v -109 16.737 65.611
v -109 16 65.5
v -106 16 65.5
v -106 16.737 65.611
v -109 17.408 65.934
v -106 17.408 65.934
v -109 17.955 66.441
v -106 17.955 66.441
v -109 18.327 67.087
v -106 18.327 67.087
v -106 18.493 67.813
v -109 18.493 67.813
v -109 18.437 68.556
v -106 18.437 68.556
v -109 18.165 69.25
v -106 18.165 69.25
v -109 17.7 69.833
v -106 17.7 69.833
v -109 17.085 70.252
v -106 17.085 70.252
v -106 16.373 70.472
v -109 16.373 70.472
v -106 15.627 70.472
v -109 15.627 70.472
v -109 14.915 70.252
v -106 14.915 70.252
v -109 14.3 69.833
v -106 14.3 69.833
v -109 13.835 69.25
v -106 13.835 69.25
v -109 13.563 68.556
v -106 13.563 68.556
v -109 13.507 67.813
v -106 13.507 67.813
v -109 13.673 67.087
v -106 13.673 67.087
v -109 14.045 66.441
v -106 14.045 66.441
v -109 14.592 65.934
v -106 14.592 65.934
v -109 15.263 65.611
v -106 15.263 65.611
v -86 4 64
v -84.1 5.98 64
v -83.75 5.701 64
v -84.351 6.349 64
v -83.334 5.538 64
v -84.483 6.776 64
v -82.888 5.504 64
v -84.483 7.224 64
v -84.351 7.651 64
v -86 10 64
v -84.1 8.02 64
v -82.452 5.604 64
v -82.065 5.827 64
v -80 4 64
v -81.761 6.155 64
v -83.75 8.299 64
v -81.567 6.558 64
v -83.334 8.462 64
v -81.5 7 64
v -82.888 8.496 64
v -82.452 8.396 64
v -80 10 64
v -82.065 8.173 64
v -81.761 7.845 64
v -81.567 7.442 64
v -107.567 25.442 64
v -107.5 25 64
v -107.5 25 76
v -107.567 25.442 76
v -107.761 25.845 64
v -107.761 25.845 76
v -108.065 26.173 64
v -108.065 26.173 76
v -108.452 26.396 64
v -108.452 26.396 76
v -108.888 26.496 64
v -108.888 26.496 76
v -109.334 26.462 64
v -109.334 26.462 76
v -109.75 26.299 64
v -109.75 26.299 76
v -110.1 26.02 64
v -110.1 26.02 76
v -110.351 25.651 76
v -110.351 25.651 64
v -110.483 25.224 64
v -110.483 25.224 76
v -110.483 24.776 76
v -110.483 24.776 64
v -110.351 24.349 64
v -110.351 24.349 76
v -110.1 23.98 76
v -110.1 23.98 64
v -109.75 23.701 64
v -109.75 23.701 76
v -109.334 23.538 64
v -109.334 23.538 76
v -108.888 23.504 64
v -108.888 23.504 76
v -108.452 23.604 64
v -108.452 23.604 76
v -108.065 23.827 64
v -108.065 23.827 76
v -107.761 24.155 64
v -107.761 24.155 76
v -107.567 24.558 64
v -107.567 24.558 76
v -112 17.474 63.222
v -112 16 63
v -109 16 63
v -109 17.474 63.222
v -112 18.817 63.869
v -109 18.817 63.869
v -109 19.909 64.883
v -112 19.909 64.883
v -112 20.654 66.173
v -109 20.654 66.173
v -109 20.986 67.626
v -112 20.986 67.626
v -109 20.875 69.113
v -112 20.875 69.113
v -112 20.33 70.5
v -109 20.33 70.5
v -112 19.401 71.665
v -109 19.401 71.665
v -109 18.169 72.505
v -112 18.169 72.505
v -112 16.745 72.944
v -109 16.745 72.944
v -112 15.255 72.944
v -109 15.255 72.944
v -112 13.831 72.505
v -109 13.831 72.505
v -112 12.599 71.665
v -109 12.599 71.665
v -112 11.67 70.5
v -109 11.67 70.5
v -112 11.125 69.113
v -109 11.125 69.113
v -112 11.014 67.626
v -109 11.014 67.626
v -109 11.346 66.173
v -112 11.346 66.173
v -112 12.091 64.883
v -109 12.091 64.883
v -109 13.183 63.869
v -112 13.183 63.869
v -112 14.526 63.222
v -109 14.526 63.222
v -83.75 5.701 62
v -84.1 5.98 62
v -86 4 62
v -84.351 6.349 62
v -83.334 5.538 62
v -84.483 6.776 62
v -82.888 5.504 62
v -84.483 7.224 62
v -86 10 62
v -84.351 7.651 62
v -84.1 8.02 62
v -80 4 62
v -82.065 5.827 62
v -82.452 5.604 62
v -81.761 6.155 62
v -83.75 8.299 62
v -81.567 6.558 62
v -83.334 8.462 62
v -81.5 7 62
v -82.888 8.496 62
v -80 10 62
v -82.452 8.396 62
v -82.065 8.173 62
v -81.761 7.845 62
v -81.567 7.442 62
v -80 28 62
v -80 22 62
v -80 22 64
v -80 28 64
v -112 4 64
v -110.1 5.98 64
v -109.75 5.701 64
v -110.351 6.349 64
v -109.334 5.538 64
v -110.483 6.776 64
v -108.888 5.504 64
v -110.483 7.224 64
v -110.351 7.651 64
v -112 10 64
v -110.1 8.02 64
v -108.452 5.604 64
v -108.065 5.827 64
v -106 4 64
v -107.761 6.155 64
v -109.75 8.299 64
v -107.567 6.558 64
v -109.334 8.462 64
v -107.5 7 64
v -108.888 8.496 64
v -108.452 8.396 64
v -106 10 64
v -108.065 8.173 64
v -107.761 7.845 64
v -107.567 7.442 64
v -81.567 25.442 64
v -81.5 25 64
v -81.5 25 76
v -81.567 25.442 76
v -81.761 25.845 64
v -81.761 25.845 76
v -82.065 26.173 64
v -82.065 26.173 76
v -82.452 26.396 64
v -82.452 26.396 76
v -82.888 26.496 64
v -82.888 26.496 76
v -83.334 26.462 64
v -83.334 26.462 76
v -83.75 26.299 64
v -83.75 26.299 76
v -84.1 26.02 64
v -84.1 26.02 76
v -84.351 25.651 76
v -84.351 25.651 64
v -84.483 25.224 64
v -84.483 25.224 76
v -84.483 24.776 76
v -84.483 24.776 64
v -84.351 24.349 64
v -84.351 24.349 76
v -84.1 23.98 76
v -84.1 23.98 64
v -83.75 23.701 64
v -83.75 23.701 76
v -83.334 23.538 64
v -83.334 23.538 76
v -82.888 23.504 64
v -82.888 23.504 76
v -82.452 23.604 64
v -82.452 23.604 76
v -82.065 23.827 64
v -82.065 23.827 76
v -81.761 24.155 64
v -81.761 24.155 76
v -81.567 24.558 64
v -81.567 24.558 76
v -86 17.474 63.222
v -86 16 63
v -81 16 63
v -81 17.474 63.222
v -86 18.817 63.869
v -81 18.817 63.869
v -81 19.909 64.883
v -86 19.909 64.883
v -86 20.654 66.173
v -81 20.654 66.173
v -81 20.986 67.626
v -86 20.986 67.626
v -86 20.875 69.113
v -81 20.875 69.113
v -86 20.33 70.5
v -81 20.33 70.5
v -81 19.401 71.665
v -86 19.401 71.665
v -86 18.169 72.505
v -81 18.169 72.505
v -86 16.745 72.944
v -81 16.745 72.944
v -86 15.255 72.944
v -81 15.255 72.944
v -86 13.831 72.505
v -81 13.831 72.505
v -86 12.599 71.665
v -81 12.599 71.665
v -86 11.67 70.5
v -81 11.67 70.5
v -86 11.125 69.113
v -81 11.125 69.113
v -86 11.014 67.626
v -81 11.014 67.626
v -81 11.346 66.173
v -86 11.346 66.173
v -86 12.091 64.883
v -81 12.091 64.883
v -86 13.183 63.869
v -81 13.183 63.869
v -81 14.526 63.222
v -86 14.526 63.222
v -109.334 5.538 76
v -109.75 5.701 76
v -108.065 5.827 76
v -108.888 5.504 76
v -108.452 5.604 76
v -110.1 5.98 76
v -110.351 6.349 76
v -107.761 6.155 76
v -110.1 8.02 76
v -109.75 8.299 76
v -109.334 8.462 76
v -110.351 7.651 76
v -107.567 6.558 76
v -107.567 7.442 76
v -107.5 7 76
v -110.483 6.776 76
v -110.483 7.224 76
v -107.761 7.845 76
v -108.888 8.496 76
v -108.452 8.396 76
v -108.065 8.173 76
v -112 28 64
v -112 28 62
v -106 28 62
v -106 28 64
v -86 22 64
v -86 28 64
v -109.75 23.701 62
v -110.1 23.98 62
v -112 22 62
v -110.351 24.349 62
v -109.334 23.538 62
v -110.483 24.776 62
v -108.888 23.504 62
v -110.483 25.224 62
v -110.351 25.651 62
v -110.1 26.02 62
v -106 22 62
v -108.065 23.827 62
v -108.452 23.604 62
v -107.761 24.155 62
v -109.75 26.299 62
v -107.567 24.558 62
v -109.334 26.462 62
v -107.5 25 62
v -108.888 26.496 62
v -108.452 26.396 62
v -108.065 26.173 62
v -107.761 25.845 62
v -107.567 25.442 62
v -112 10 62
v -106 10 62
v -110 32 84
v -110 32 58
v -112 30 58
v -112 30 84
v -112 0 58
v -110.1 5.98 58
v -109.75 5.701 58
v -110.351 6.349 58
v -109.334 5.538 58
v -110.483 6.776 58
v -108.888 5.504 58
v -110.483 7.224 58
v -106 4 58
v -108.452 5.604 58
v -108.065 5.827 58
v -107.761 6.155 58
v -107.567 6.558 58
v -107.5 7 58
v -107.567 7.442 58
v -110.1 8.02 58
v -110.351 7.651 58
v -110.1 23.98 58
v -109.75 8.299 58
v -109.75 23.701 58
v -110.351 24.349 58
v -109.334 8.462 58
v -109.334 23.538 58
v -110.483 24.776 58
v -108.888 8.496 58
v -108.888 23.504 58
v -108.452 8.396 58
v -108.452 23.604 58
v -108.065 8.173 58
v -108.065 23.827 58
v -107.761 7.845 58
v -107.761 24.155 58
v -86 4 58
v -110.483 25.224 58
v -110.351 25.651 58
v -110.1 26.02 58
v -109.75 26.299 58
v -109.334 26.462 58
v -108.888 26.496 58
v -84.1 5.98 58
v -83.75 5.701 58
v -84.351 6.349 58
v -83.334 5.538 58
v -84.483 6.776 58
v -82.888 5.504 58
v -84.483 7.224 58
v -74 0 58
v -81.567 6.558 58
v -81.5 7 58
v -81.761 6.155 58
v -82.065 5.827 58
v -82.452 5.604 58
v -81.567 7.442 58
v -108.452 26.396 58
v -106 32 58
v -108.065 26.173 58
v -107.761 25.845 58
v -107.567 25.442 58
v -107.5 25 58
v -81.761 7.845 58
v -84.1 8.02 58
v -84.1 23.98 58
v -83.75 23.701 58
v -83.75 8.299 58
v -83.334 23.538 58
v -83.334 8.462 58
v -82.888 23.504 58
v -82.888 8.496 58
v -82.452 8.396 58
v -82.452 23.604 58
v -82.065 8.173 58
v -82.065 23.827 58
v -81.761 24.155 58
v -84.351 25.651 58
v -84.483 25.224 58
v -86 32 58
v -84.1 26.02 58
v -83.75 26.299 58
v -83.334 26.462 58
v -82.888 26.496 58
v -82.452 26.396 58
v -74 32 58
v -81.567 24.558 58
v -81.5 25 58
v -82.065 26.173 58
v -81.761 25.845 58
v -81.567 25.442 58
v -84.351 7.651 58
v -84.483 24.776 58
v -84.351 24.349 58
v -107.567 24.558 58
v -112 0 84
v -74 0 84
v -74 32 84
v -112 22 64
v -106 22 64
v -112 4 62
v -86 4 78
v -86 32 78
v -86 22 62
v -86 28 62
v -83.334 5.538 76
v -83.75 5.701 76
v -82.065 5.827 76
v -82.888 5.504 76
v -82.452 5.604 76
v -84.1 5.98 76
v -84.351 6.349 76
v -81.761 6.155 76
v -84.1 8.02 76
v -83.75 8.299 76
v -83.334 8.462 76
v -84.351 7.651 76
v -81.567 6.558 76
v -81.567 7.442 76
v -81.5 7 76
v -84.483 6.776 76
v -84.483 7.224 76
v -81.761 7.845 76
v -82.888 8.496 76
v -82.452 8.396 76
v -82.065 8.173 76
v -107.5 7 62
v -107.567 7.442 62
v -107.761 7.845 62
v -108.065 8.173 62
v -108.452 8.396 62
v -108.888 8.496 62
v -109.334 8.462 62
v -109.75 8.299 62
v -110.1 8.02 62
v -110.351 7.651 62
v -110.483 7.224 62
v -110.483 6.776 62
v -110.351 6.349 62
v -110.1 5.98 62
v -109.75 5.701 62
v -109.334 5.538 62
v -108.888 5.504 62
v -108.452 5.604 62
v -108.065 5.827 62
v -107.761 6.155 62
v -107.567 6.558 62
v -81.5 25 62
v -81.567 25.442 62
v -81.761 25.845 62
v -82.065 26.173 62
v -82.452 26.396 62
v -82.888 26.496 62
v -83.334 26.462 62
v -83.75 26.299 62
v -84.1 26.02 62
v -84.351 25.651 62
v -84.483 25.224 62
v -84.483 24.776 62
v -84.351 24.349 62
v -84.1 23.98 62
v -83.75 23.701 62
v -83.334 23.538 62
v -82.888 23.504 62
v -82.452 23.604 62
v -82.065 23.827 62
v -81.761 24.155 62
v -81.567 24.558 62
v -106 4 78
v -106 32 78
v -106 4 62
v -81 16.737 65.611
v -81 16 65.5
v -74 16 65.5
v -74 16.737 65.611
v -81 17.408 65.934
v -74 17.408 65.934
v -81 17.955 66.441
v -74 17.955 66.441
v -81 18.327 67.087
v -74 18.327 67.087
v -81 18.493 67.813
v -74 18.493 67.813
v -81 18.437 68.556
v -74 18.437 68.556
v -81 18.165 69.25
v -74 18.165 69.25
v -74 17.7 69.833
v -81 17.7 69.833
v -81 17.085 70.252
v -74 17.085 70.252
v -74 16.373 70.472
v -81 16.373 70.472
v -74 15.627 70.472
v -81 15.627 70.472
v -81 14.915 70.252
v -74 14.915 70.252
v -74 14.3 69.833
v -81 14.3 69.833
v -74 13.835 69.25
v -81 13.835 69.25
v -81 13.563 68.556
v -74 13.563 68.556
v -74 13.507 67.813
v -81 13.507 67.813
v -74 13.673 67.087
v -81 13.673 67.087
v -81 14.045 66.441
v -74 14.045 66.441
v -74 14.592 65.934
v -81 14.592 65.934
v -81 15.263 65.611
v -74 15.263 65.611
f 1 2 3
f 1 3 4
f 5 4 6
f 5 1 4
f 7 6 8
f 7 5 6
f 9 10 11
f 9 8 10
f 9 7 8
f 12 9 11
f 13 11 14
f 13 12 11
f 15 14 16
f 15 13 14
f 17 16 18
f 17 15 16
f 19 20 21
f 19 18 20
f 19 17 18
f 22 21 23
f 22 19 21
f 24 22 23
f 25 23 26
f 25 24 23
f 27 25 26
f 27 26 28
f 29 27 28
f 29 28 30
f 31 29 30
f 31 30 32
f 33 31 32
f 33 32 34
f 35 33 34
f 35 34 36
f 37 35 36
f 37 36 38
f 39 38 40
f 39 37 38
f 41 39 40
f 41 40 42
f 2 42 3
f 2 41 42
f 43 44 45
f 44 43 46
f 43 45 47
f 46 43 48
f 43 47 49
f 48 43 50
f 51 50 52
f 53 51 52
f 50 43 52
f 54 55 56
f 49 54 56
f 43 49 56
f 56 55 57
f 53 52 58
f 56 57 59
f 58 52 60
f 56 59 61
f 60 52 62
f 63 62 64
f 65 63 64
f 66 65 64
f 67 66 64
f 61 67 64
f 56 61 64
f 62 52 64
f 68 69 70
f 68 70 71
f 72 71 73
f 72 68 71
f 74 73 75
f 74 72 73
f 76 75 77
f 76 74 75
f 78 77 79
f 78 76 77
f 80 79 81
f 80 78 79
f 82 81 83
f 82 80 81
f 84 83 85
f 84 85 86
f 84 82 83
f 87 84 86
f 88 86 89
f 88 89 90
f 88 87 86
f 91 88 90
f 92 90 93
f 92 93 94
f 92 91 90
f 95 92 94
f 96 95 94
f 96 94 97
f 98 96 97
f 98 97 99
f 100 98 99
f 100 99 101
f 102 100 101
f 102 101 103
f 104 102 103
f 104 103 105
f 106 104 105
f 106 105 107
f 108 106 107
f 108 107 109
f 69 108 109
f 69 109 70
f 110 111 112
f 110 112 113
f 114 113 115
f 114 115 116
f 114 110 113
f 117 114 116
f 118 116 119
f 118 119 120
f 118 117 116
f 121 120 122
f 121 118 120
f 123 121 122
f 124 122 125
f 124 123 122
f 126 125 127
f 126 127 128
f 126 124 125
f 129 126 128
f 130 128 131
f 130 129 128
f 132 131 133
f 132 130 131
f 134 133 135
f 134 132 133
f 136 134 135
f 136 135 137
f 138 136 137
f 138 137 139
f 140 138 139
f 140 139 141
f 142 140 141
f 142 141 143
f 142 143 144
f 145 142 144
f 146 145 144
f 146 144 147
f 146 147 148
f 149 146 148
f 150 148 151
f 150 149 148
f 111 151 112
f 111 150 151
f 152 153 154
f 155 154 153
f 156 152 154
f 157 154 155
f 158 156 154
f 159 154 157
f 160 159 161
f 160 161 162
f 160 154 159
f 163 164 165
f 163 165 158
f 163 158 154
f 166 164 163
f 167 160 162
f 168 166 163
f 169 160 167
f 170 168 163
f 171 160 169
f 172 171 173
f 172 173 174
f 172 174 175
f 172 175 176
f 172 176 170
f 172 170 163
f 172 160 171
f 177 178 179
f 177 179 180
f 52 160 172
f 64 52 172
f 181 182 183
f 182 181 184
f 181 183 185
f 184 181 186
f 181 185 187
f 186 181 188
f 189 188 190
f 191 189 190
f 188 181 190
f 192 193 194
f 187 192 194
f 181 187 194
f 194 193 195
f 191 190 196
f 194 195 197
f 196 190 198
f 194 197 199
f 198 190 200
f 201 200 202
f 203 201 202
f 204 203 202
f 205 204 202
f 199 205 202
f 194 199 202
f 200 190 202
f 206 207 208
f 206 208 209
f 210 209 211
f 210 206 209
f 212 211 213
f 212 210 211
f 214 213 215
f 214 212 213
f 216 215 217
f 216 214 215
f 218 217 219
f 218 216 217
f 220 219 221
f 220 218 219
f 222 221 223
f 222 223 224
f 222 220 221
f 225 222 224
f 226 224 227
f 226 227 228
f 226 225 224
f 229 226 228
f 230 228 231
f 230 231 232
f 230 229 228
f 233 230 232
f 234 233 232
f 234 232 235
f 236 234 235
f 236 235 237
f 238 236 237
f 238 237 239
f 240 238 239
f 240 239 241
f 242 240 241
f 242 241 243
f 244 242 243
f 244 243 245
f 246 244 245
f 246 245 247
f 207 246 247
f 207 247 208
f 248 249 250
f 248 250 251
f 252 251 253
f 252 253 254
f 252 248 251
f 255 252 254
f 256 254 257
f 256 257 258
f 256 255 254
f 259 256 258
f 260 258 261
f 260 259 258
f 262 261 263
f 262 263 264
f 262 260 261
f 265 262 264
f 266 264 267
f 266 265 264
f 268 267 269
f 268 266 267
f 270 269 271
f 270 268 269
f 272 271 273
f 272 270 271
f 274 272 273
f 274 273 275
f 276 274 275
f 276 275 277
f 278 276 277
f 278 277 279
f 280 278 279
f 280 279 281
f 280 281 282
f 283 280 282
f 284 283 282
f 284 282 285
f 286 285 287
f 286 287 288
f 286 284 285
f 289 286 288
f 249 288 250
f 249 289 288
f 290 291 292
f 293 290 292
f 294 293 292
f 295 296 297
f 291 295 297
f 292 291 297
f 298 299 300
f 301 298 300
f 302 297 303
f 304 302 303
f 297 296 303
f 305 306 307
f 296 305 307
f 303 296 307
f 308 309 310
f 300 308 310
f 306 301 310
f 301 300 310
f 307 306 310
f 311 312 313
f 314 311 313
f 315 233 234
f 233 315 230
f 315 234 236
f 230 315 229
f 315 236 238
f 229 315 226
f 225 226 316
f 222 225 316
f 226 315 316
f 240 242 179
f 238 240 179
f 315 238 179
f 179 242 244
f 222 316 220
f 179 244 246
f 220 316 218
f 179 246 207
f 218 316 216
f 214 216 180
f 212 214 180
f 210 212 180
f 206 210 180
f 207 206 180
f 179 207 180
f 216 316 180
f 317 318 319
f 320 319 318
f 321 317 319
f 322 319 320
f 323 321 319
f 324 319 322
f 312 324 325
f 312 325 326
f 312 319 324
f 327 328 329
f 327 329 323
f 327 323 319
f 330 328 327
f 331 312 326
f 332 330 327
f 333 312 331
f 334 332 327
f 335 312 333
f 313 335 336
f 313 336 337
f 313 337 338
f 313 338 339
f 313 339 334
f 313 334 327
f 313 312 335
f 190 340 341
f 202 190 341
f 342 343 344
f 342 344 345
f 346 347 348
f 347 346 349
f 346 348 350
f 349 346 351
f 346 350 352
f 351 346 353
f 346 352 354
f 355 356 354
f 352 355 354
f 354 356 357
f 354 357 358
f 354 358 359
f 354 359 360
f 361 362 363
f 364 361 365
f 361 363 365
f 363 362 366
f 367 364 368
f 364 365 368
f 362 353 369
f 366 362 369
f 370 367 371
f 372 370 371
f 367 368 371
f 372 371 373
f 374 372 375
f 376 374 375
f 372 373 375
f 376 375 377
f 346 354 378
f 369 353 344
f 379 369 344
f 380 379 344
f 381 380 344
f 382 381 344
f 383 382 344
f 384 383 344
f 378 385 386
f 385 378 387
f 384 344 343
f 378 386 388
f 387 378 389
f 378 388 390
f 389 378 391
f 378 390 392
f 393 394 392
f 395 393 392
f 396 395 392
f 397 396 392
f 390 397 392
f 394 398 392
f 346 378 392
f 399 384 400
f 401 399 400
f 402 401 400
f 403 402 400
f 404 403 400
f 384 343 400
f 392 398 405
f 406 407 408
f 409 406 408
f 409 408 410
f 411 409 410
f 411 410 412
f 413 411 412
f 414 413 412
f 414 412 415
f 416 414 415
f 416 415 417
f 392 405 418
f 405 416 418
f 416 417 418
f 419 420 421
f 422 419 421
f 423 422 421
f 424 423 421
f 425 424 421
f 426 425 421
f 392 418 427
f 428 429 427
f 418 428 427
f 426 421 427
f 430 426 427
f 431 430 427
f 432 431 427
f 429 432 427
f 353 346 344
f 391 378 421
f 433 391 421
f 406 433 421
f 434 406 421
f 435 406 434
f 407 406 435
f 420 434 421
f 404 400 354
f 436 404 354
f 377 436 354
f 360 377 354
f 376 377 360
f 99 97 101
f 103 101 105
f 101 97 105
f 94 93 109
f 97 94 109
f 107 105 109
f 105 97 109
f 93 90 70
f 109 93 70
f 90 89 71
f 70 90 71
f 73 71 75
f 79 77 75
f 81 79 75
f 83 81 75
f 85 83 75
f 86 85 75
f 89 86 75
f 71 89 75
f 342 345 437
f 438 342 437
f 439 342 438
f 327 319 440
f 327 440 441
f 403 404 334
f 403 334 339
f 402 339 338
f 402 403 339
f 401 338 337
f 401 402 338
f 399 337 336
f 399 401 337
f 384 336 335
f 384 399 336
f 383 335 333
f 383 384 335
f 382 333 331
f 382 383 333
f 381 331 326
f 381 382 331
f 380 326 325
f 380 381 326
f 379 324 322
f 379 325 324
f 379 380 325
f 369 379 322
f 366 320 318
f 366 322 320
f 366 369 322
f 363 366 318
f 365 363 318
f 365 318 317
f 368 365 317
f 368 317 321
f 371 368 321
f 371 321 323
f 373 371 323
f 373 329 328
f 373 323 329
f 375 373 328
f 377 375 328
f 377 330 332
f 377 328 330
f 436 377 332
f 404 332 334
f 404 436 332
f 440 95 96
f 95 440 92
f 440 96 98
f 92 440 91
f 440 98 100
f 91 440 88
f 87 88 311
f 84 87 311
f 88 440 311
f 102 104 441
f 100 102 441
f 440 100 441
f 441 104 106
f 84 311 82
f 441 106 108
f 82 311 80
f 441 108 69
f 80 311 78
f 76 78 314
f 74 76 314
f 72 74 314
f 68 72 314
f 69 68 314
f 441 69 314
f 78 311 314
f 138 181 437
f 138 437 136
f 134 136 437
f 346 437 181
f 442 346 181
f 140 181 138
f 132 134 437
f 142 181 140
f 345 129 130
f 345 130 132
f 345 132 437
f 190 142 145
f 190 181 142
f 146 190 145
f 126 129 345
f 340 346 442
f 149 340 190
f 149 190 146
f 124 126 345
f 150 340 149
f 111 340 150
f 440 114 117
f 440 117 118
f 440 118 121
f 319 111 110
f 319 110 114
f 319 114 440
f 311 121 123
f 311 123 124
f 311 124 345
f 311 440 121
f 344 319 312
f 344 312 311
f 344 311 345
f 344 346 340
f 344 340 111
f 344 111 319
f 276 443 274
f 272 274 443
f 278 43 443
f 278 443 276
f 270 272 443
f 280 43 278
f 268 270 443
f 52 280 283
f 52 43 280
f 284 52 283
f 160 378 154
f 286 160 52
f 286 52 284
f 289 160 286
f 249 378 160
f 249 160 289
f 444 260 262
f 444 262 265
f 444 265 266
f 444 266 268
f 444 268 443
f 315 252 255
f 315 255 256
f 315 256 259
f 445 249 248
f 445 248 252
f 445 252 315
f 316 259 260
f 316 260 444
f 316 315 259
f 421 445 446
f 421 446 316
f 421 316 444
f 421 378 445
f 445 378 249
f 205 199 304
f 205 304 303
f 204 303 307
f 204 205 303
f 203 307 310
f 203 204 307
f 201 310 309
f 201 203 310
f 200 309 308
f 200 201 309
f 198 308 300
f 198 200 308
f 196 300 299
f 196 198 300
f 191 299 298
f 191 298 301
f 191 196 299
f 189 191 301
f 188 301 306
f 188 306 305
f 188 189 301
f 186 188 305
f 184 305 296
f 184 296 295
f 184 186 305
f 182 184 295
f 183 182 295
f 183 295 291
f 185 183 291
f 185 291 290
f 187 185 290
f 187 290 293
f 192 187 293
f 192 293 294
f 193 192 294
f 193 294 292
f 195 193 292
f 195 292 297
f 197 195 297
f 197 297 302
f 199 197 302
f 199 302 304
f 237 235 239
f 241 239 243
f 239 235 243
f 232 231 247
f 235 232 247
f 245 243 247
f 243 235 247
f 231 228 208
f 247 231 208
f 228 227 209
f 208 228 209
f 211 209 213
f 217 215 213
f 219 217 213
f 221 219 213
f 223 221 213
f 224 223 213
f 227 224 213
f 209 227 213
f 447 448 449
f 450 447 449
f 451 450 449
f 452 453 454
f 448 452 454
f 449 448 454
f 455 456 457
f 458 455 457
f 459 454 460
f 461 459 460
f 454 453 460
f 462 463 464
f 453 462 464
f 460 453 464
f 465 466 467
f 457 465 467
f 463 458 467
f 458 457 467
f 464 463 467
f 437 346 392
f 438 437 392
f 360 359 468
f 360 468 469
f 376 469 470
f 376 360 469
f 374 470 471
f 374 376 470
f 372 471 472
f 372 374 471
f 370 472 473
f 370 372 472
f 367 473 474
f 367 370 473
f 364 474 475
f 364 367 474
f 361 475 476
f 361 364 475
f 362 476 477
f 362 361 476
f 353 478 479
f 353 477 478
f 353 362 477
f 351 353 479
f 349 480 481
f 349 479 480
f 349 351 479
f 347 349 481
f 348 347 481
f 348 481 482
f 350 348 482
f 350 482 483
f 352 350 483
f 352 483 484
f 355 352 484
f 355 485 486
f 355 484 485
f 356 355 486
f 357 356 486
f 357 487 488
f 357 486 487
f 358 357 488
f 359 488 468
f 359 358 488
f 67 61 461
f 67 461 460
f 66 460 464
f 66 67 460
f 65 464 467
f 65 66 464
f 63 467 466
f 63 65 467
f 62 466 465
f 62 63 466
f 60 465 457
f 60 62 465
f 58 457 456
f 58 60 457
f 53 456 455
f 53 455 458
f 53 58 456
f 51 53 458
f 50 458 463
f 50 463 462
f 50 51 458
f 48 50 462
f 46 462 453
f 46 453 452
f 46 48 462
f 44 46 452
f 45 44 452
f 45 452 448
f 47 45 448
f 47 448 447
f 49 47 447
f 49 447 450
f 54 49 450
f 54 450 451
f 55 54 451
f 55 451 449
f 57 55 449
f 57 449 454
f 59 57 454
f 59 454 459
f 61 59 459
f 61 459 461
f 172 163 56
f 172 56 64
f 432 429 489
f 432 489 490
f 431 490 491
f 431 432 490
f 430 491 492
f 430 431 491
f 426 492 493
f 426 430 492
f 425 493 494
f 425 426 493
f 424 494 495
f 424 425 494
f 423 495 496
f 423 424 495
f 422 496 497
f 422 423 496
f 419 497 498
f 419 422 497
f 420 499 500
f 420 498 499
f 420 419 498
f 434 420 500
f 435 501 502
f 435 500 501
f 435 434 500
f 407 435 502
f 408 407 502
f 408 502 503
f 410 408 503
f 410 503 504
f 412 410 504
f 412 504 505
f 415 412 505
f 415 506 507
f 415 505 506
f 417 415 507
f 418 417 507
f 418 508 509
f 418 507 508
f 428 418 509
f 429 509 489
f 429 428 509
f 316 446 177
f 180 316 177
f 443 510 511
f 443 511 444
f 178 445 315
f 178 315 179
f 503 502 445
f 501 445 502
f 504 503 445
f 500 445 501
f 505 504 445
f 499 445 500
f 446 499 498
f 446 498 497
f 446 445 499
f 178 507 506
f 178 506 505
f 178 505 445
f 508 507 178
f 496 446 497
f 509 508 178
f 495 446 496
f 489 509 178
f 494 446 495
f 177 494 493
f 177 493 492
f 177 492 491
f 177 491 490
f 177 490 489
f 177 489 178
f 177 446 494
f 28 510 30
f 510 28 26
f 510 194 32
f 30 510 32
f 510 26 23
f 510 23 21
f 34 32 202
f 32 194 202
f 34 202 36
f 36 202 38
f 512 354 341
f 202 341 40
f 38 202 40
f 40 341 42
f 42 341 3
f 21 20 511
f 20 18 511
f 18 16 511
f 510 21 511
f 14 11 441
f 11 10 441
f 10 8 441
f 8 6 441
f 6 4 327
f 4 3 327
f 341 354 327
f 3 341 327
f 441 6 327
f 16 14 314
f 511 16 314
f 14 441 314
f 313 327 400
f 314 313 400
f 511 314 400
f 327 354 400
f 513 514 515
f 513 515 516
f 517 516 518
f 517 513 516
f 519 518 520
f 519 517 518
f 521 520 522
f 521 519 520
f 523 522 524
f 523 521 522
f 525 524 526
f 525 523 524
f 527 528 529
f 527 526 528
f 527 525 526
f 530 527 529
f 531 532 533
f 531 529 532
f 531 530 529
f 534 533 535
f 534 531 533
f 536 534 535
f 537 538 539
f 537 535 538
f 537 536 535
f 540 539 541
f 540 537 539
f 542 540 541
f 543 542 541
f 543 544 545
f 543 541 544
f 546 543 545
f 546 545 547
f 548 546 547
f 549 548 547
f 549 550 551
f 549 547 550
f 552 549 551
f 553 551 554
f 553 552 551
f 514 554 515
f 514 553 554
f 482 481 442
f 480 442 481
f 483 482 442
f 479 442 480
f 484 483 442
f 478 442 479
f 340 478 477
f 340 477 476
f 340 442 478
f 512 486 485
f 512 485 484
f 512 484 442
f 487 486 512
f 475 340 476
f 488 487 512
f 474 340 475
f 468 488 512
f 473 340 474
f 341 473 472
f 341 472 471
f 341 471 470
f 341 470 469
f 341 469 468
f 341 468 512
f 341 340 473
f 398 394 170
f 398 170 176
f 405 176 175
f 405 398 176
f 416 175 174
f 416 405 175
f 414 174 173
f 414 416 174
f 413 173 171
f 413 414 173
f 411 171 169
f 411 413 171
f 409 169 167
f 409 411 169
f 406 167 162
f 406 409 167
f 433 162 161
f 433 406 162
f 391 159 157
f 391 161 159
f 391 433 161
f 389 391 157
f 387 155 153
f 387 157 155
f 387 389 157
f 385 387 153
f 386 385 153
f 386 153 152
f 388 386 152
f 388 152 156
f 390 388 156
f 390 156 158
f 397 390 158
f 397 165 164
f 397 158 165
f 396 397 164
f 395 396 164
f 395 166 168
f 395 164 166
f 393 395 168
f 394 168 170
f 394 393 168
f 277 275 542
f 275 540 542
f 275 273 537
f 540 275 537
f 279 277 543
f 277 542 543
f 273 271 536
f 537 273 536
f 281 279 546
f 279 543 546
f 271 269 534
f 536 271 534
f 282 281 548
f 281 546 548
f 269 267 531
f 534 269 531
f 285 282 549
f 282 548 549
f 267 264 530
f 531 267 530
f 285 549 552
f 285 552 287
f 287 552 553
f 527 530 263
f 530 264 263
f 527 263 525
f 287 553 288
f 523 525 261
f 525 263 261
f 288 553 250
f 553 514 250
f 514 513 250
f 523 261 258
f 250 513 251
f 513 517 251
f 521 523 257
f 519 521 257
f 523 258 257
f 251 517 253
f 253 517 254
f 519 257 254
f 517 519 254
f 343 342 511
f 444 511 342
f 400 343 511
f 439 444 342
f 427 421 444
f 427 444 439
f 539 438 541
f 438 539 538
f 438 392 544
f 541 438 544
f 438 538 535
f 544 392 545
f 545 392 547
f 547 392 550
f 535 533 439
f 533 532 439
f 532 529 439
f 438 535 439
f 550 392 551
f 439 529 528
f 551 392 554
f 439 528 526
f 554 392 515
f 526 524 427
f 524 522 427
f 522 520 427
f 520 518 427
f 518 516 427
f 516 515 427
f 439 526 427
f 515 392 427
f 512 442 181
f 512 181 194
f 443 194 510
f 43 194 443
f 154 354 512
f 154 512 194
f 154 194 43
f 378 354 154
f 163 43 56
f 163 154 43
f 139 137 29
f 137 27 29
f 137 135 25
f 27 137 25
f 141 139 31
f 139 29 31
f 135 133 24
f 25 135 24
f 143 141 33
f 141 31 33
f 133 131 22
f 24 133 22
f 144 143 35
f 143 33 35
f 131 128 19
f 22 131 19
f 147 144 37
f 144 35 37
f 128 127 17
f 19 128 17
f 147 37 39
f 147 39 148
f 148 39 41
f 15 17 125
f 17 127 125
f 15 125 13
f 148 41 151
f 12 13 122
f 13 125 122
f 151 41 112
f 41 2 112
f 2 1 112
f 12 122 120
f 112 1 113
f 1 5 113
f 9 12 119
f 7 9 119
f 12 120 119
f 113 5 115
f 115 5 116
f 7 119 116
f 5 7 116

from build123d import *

# Parameters (mm, degrees)
CYLINDER1887_R     = 5
CYLINDER1887_DEPTH = 5
CYLINDER1886_R     = 2.5
CYLINDER1886_DEPTH = 40
CYLINDER1800_R     = 5
CYLINDER1800_DEPTH = 3
CYLINDER1801_R     = 2.5
CYLINDER1801_DEPTH = 20
CYLINDER1798_R     = 1.5
CYLINDER1798_DEPTH = 20
CYLINDER1796_R     = 1.5
CYLINDER1796_DEPTH = 20
CYLINDER1797_R     = 1.5
CYLINDER1797_DEPTH = 20
CYLINDER1799_R     = 1.5
CYLINDER1799_DEPTH = 20
BOX758_W           = 6
BOX758_H           = 6
BOX758_DEPTH       = 2
BOX760_W           = 6
BOX760_H           = 6
BOX760_DEPTH       = 2
BOX759_W           = 6
BOX759_H           = 6
BOX759_DEPTH       = 2
BOX756_W           = 6
BOX756_H           = 6
BOX756_DEPTH       = 2
BOX757_W           = 20
BOX757_H           = 80
BOX757_DEPTH       = 20
BOX761_W           = 38
BOX761_H           = 32
BOX761_DEPTH       = 26
CHAMFER064_SIZE    = 2


with BuildPart() as v_lec1887:
    # Cylinder1887 → Cylinder1887 (new body)
    with BuildSketch(Plane(origin=(-86, 16, 68), x_dir=(0, 0, -1), z_dir=(1, 0, 0))):
        Circle(CYLINDER1887_R)
    extrude(amount=CYLINDER1887_DEPTH)


with BuildPart() as v_lec1886:
    # Cylinder1886 → Cylinder1886 (new body)
    with BuildSketch(Plane(origin=(-90, 16, 68), x_dir=(0, 0, -1), z_dir=(1, 0, 0))):
        Circle(CYLINDER1886_R)
    extrude(amount=CYLINDER1886_DEPTH)


with BuildPart() as v_lec1800:
    # Cylinder1800 → Cylinder1800 (new body)
    with BuildSketch(Plane(origin=(-112, 16, 66), x_dir=(0, 0, -1), z_dir=(1, 0, 0))):
        Circle(CYLINDER1800_R)
    extrude(amount=CYLINDER1800_DEPTH)


with BuildPart() as v_lec1801:
    # Cylinder1801 → Cylinder1801 (new body)
    with BuildSketch(Plane(origin=(-117, 16, 66), x_dir=(0, 0, -1), z_dir=(1, 0, 0))):
        Circle(CYLINDER1801_R)
    extrude(amount=CYLINDER1801_DEPTH)


with BuildPart() as v_lec1798:
    # Cylinder1798 → Cylinder1798 (new body)
    with BuildSketch(Plane(origin=(-83, 25, 54), x_dir=(1, 0, 0), z_dir=(0, 0, 1))):
        Circle(CYLINDER1798_R)
    extrude(amount=CYLINDER1798_DEPTH)


with BuildPart() as v_lec1796:
    # Cylinder1796 → Cylinder1796 (new body)
    with BuildSketch(Plane(origin=(-109, 7, 54), x_dir=(1, 0, 0), z_dir=(0, 0, 1))):
        Circle(CYLINDER1796_R)
    extrude(amount=CYLINDER1796_DEPTH)


with BuildPart() as v_lec1797:
    # Cylinder1797 → Cylinder1797 (new body)
    with BuildSketch(Plane(origin=(-109, 25, 54), x_dir=(1, 0, 0), z_dir=(0, 0, 1))):
        Circle(CYLINDER1797_R)
    extrude(amount=CYLINDER1797_DEPTH)


with BuildPart() as compound920:
    # Cylinder1799 → Cylinder1799 (new body)
    with BuildSketch(Plane(origin=(-83, 7, 54), x_dir=(1, 0, 0), z_dir=(0, 0, 1))):
        Circle(CYLINDER1799_R)
    extrude(amount=CYLINDER1799_DEPTH)

    # Compound920: union Válec1798, Válec1796, Válec1797
    add(v_lec1798.part)
    add(v_lec1796.part)
    add(v_lec1797.part)


with BuildPart() as krychle758:
    # Box758 → Box758 (new body)
    with BuildSketch(Plane(origin=(-112, 22, 60), x_dir=(1, 0, 0), z_dir=(0, 0, 1))):
        with Locations((3, 3)):
            Rectangle(BOX758_W, BOX758_H)
    extrude(amount=BOX758_DEPTH)


with BuildPart() as krychle760:
    # Box760 → Box760 (new body)
    with BuildSketch(Plane(origin=(-86, 4, 60), x_dir=(1, 0, 0), z_dir=(0, 0, 1))):
        with Locations((3, 3)):
            Rectangle(BOX760_W, BOX760_H)
    extrude(amount=BOX760_DEPTH)


with BuildPart() as krychle759:
    # Box759 → Box759 (new body)
    with BuildSketch(Plane(origin=(-86, 22, 60), x_dir=(1, 0, 0), z_dir=(0, 0, 1))):
        with Locations((3, 3)):
            Rectangle(BOX759_W, BOX759_H)
    extrude(amount=BOX759_DEPTH)


with BuildPart() as compound918:
    # Box756 → Box756 (new body)
    with BuildSketch(Plane(origin=(-112, 4, 60), x_dir=(1, 0, 0), z_dir=(0, 0, 1))):
        with Locations((3, 3)):
            Rectangle(BOX756_W, BOX756_H)
    extrude(amount=BOX756_DEPTH)

    # Compound918: union Krychle758, Krychle760, Krychle759
    add(krychle758.part)
    add(krychle760.part)
    add(krychle759.part)


with BuildPart() as krychle757:
    # Box757 → Box757 (new body)
    with BuildSketch(Plane(origin=(-106, 4, 56), x_dir=(1, 0, 0), z_dir=(0, 0, 1))):
        with Locations((10, 40)):
            Rectangle(BOX757_W, BOX757_H)
    extrude(amount=BOX757_DEPTH)


with BuildPart() as cut620:
    # Box761 → Box761 (new body)
    with BuildSketch(Plane(origin=(-112, 0, 56), x_dir=(1, 0, 0), z_dir=(0, 0, 1))):
        with Locations((19, 16)):
            Rectangle(BOX761_W, BOX761_H)
    extrude(amount=BOX761_DEPTH)

    # Cut567: cut Krychle757
    add(krychle757.part, mode=Mode.SUBTRACT)

    # Cut569: cut Compound918
    add(compound918.part, mode=Mode.SUBTRACT)

    # Cut563: cut Compound920
    add(compound920.part, mode=Mode.SUBTRACT)

    # Cut564: cut Válec1801
    add(v_lec1801.part, mode=Mode.SUBTRACT)

    # Cut560: cut Válec1800
    add(v_lec1800.part, mode=Mode.SUBTRACT)

    # Chamfer064
    chamfer064_edges = [cut620.edges().sort_by_distance(p)[0] for p in [
        (-112, 32, 69),
    ]]
    chamfer(chamfer064_edges, length=CHAMFER064_SIZE)


with BuildPart() as cut620_1:
    # Chamfer064 placement: moved
    add(cut620.part.moved(Location((0, 0, 2))))

    # Cut619: cut Válec1886
    add(v_lec1886.part, mode=Mode.SUBTRACT)

    # Cut620: cut Válec1887
    add(v_lec1887.part, mode=Mode.SUBTRACT)


solid = cut620_1.part
